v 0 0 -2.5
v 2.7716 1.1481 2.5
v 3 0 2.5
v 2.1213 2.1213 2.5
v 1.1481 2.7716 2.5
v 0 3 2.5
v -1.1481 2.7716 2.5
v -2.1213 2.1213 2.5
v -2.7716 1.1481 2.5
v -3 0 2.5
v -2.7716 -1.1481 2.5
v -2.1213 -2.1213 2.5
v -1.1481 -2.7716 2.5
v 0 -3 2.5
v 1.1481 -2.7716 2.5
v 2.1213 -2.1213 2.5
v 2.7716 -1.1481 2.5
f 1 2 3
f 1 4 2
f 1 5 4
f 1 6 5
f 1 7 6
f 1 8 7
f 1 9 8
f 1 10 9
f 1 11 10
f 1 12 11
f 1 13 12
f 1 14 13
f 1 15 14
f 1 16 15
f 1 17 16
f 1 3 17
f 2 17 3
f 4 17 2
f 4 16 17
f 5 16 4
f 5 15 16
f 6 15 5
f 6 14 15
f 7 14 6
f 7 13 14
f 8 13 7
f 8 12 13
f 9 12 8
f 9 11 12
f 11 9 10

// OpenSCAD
// point at the bottom, centered
cylinder(h = 5, r1 = 0, r2 = 3, center = true, $fn = 16);
